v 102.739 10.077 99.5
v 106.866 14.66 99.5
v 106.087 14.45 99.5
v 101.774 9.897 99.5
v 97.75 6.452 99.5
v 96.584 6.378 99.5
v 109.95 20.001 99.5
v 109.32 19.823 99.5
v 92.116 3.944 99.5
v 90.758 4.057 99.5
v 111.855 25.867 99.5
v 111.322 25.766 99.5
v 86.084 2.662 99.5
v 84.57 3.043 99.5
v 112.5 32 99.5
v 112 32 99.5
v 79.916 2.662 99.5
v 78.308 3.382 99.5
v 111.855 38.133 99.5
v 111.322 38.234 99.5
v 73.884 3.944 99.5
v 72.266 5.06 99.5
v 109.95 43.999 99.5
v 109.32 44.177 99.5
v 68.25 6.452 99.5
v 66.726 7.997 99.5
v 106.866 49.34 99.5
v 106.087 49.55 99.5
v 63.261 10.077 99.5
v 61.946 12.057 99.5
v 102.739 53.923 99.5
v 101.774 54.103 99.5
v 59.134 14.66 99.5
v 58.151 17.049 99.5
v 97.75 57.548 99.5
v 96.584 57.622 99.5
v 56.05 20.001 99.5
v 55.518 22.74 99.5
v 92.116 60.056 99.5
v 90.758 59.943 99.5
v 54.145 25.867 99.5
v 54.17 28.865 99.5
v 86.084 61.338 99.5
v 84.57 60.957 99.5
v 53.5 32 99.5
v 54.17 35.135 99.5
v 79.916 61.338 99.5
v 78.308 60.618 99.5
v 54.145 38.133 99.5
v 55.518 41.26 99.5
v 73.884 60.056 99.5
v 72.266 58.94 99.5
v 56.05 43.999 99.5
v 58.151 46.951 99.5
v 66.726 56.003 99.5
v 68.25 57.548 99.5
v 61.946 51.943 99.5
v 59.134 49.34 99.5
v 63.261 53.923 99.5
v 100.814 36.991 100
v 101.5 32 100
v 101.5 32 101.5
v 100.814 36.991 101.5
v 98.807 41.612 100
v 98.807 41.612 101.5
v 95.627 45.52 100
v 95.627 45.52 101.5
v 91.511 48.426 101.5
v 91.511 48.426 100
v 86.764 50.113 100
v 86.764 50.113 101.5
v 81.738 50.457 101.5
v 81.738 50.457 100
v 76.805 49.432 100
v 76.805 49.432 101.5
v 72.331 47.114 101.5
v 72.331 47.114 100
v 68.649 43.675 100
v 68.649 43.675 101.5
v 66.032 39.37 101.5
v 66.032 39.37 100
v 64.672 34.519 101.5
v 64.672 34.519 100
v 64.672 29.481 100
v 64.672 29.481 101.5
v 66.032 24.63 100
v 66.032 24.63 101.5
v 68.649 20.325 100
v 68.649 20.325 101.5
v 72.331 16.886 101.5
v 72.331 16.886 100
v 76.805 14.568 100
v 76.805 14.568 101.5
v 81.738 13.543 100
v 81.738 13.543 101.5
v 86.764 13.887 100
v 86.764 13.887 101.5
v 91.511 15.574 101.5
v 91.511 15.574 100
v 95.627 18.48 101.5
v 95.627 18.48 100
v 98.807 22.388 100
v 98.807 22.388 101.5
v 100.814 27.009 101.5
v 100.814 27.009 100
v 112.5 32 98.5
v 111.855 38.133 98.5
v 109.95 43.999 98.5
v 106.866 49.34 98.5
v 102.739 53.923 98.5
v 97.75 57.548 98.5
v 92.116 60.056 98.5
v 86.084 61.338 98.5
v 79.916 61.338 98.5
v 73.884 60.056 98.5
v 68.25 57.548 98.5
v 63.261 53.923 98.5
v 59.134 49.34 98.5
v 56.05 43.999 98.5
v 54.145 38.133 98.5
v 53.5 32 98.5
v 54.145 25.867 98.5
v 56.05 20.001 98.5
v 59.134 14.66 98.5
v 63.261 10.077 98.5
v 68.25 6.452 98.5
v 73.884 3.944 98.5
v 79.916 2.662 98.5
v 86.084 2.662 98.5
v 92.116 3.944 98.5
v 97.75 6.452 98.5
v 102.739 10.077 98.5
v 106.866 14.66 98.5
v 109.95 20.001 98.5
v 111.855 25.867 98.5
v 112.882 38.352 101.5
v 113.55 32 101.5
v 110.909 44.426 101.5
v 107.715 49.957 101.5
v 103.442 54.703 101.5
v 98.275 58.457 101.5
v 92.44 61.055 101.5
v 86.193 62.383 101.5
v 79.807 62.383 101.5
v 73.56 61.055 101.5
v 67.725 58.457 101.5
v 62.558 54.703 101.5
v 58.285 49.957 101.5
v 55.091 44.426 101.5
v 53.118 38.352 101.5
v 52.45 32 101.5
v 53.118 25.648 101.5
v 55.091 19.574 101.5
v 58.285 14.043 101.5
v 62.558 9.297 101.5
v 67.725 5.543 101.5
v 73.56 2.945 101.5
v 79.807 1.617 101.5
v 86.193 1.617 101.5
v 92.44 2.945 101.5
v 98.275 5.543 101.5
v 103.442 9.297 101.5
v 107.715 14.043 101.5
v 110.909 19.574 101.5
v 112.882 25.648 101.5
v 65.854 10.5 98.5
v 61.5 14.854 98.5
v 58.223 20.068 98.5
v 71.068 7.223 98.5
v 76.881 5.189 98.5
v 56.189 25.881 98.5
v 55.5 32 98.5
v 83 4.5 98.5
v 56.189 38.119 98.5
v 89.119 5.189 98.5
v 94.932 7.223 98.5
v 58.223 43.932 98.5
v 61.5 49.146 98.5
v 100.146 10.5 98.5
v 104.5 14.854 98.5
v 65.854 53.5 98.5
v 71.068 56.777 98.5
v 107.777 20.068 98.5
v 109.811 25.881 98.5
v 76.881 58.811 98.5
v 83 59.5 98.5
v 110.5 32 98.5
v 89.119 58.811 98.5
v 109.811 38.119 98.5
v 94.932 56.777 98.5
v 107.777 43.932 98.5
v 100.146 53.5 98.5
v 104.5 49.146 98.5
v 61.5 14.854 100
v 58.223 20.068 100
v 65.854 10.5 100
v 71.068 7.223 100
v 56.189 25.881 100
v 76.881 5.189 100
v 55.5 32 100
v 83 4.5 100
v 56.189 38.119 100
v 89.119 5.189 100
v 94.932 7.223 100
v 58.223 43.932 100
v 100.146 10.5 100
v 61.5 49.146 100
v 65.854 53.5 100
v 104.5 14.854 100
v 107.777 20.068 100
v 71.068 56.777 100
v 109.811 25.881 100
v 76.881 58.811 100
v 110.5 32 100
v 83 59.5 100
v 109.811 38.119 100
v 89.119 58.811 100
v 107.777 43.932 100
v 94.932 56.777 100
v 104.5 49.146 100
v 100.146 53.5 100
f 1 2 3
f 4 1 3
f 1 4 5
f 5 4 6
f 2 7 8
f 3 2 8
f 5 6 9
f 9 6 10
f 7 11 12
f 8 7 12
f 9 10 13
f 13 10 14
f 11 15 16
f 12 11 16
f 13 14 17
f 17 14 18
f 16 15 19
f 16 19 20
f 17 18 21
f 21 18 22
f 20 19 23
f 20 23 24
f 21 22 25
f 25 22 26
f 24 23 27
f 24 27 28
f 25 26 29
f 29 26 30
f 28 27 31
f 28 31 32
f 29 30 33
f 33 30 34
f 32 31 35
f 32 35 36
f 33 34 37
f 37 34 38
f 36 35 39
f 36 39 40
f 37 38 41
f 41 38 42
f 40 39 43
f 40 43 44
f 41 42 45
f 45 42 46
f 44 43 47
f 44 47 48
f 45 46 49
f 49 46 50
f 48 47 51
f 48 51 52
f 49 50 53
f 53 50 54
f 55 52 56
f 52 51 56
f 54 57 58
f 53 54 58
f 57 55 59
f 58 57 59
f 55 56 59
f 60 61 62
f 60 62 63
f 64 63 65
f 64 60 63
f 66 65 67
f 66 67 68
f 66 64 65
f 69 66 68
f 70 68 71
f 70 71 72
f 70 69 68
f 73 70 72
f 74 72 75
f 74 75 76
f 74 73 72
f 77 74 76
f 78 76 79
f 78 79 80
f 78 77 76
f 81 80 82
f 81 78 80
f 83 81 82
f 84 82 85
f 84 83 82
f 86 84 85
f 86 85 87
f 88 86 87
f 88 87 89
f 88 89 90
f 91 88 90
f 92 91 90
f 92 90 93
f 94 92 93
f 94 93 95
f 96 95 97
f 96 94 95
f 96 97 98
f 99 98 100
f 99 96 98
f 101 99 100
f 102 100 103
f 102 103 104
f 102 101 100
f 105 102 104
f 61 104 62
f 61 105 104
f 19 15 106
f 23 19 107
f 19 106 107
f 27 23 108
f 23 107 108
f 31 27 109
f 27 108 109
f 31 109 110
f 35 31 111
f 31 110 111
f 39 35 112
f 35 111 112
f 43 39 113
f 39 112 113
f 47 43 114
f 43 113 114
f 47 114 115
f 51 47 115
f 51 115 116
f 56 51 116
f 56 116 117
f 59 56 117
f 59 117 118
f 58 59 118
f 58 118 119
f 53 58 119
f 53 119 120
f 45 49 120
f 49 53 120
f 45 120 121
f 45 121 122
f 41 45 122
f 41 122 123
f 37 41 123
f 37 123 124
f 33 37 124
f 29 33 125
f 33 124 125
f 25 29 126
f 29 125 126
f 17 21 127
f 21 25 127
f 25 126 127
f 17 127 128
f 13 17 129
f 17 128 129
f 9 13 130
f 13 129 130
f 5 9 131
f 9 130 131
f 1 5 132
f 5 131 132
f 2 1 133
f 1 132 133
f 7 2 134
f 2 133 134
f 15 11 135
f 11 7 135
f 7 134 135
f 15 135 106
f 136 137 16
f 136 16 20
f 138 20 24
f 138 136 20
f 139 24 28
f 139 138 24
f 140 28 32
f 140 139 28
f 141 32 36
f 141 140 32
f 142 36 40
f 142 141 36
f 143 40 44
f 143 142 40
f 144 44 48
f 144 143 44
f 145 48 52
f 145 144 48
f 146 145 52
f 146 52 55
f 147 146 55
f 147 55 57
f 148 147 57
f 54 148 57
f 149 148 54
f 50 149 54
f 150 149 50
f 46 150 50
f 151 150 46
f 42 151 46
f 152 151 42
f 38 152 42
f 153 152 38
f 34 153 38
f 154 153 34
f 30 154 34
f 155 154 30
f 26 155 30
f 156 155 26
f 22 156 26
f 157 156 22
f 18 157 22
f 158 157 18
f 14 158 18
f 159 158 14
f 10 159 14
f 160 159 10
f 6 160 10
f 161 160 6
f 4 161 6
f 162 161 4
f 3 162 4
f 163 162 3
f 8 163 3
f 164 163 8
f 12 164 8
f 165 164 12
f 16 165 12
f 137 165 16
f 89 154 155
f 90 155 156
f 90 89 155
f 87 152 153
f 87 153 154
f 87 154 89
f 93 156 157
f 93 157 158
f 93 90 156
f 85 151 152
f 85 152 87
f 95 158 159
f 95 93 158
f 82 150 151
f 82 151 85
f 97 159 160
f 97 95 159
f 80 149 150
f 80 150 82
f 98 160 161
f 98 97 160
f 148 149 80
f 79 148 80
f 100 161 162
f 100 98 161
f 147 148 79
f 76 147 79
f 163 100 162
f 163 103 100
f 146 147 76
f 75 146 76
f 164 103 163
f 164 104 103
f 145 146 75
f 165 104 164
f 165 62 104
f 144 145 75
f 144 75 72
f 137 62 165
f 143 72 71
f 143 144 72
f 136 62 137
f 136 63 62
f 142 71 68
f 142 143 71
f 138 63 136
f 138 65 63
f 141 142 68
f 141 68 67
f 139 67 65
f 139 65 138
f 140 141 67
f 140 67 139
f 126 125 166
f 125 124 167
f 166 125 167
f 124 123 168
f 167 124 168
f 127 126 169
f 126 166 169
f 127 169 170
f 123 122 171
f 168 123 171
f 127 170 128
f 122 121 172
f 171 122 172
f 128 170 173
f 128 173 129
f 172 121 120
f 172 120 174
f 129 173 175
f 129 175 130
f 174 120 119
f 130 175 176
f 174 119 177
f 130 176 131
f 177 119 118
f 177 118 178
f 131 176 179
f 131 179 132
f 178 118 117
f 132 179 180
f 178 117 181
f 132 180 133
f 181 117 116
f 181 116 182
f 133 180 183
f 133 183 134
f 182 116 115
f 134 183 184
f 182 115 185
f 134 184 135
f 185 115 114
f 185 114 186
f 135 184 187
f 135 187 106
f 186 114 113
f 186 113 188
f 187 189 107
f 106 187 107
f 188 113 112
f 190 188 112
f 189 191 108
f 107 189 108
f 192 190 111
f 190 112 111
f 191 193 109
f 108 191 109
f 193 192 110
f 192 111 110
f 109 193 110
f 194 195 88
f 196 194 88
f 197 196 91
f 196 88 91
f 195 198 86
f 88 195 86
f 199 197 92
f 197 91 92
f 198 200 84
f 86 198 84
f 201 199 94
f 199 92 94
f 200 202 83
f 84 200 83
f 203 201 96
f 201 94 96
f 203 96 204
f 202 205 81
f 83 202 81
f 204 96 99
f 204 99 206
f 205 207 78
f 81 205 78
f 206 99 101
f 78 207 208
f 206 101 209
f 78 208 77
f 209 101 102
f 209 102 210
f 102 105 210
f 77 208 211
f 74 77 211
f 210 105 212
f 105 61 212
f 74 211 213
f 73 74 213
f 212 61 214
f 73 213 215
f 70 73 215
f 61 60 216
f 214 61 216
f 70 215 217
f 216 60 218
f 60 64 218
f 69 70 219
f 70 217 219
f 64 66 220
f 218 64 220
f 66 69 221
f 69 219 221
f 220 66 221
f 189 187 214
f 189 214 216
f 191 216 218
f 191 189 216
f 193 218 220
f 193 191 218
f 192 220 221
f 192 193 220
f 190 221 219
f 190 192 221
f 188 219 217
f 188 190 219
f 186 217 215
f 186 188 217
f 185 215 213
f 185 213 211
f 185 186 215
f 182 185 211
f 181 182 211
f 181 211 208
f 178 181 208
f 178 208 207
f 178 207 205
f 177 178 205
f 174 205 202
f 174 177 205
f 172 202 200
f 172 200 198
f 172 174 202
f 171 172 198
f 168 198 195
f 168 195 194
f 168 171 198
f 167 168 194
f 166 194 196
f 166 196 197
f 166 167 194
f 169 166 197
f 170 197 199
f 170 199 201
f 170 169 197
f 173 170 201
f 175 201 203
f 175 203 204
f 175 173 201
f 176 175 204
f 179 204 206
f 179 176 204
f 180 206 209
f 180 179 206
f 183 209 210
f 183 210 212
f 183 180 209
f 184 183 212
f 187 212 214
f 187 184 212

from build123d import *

# Parameters (mm, degrees)
CYLINDER009_R     = 18.5
CYLINDER009_DEPTH = 1.5
CYLINDER008_R     = 31
CYLINDER008_DEPTH = 1.5
CYLINDER007_R     = 27.5
CYLINDER007_DEPTH = 10
CYLINDER006_R     = 27.5
CYLINDER006_DEPTH = 1.5
CYLINDER005_R     = 29.5
CYLINDER005_DEPTH = 1.5


with BuildPart() as cone002:
    # Cone002 → Cone002 (revolve)
    with BuildSketch(Plane.XZ):
        Polygon((0, 0), (29, 0), (60, 40), (0, 40), align=None)
    revolve(axis=Axis((0, 0, 0), (0, 0, 1)))


with BuildPart() as cut013:
    # Cone003 → Cone003 (revolve)
    with BuildSketch(Plane.XZ):
        Polygon((0, 0), (31, 0), (62, 40), (0, 40), align=None)
    revolve(axis=Axis((0, 0, 0), (0, 0, 1)))

    # Cut013: cut Cone002
    add(cone002.part, mode=Mode.SUBTRACT)


with BuildPart() as cut013_1:
    # Cut013 placement: moved
    add(cut013.part.moved(Location((83, 32, 99.5))))


with BuildPart() as cylinder009:
    # Cylinder009 → Cylinder009 (new body)
    with BuildSketch(Plane.XY):
        Circle(CYLINDER009_R)
    extrude(amount=CYLINDER009_DEPTH)


with BuildPart() as cut010:
    # Cylinder008 → Cylinder008 (new body)
    with BuildSketch(Plane.XY):
        Circle(CYLINDER008_R)
    extrude(amount=CYLINDER008_DEPTH)

    # Cut010: cut Cylinder009
    add(cylinder009.part, mode=Mode.SUBTRACT)


with BuildPart() as cut010_1:
    # Cut010 placement: moved
    add(cut010.part.moved(Location((0, 0, 1.5))))


with BuildPart() as cylinder007:
    # Cylinder007 → Cylinder007 (new body)
    with BuildSketch(Plane.XY):
        Circle(CYLINDER007_R)
    extrude(amount=CYLINDER007_DEPTH)


with BuildPart() as cylinder006:
    # Cylinder006 → Cylinder006 (new body)
    with BuildSketch(Plane.XY):
        Circle(CYLINDER006_R)
    extrude(amount=CYLINDER006_DEPTH)


with BuildPart() as union:
    # Cylinder005 → Cylinder005 (new body)
    with BuildSketch(Plane.XY):
        Circle(CYLINDER005_R)
    extrude(amount=CYLINDER005_DEPTH)

    # Cut008: cut Cylinder006
    add(cylinder006.part, mode=Mode.SUBTRACT)

    # Cut009: cut Cylinder007
    add(cylinder007.part, mode=Mode.SUBTRACT)

    # Fusion004: union Cut010
    add(cut010_1.part)


with BuildPart() as union_1:
    # Fusion004 placement: moved
    add(union.part.moved(Location((83, 32, 98.5))))

    # Cut014: cut Cut013
    add(cut013_1.part, mode=Mode.SUBTRACT)


solid = union_1.part
